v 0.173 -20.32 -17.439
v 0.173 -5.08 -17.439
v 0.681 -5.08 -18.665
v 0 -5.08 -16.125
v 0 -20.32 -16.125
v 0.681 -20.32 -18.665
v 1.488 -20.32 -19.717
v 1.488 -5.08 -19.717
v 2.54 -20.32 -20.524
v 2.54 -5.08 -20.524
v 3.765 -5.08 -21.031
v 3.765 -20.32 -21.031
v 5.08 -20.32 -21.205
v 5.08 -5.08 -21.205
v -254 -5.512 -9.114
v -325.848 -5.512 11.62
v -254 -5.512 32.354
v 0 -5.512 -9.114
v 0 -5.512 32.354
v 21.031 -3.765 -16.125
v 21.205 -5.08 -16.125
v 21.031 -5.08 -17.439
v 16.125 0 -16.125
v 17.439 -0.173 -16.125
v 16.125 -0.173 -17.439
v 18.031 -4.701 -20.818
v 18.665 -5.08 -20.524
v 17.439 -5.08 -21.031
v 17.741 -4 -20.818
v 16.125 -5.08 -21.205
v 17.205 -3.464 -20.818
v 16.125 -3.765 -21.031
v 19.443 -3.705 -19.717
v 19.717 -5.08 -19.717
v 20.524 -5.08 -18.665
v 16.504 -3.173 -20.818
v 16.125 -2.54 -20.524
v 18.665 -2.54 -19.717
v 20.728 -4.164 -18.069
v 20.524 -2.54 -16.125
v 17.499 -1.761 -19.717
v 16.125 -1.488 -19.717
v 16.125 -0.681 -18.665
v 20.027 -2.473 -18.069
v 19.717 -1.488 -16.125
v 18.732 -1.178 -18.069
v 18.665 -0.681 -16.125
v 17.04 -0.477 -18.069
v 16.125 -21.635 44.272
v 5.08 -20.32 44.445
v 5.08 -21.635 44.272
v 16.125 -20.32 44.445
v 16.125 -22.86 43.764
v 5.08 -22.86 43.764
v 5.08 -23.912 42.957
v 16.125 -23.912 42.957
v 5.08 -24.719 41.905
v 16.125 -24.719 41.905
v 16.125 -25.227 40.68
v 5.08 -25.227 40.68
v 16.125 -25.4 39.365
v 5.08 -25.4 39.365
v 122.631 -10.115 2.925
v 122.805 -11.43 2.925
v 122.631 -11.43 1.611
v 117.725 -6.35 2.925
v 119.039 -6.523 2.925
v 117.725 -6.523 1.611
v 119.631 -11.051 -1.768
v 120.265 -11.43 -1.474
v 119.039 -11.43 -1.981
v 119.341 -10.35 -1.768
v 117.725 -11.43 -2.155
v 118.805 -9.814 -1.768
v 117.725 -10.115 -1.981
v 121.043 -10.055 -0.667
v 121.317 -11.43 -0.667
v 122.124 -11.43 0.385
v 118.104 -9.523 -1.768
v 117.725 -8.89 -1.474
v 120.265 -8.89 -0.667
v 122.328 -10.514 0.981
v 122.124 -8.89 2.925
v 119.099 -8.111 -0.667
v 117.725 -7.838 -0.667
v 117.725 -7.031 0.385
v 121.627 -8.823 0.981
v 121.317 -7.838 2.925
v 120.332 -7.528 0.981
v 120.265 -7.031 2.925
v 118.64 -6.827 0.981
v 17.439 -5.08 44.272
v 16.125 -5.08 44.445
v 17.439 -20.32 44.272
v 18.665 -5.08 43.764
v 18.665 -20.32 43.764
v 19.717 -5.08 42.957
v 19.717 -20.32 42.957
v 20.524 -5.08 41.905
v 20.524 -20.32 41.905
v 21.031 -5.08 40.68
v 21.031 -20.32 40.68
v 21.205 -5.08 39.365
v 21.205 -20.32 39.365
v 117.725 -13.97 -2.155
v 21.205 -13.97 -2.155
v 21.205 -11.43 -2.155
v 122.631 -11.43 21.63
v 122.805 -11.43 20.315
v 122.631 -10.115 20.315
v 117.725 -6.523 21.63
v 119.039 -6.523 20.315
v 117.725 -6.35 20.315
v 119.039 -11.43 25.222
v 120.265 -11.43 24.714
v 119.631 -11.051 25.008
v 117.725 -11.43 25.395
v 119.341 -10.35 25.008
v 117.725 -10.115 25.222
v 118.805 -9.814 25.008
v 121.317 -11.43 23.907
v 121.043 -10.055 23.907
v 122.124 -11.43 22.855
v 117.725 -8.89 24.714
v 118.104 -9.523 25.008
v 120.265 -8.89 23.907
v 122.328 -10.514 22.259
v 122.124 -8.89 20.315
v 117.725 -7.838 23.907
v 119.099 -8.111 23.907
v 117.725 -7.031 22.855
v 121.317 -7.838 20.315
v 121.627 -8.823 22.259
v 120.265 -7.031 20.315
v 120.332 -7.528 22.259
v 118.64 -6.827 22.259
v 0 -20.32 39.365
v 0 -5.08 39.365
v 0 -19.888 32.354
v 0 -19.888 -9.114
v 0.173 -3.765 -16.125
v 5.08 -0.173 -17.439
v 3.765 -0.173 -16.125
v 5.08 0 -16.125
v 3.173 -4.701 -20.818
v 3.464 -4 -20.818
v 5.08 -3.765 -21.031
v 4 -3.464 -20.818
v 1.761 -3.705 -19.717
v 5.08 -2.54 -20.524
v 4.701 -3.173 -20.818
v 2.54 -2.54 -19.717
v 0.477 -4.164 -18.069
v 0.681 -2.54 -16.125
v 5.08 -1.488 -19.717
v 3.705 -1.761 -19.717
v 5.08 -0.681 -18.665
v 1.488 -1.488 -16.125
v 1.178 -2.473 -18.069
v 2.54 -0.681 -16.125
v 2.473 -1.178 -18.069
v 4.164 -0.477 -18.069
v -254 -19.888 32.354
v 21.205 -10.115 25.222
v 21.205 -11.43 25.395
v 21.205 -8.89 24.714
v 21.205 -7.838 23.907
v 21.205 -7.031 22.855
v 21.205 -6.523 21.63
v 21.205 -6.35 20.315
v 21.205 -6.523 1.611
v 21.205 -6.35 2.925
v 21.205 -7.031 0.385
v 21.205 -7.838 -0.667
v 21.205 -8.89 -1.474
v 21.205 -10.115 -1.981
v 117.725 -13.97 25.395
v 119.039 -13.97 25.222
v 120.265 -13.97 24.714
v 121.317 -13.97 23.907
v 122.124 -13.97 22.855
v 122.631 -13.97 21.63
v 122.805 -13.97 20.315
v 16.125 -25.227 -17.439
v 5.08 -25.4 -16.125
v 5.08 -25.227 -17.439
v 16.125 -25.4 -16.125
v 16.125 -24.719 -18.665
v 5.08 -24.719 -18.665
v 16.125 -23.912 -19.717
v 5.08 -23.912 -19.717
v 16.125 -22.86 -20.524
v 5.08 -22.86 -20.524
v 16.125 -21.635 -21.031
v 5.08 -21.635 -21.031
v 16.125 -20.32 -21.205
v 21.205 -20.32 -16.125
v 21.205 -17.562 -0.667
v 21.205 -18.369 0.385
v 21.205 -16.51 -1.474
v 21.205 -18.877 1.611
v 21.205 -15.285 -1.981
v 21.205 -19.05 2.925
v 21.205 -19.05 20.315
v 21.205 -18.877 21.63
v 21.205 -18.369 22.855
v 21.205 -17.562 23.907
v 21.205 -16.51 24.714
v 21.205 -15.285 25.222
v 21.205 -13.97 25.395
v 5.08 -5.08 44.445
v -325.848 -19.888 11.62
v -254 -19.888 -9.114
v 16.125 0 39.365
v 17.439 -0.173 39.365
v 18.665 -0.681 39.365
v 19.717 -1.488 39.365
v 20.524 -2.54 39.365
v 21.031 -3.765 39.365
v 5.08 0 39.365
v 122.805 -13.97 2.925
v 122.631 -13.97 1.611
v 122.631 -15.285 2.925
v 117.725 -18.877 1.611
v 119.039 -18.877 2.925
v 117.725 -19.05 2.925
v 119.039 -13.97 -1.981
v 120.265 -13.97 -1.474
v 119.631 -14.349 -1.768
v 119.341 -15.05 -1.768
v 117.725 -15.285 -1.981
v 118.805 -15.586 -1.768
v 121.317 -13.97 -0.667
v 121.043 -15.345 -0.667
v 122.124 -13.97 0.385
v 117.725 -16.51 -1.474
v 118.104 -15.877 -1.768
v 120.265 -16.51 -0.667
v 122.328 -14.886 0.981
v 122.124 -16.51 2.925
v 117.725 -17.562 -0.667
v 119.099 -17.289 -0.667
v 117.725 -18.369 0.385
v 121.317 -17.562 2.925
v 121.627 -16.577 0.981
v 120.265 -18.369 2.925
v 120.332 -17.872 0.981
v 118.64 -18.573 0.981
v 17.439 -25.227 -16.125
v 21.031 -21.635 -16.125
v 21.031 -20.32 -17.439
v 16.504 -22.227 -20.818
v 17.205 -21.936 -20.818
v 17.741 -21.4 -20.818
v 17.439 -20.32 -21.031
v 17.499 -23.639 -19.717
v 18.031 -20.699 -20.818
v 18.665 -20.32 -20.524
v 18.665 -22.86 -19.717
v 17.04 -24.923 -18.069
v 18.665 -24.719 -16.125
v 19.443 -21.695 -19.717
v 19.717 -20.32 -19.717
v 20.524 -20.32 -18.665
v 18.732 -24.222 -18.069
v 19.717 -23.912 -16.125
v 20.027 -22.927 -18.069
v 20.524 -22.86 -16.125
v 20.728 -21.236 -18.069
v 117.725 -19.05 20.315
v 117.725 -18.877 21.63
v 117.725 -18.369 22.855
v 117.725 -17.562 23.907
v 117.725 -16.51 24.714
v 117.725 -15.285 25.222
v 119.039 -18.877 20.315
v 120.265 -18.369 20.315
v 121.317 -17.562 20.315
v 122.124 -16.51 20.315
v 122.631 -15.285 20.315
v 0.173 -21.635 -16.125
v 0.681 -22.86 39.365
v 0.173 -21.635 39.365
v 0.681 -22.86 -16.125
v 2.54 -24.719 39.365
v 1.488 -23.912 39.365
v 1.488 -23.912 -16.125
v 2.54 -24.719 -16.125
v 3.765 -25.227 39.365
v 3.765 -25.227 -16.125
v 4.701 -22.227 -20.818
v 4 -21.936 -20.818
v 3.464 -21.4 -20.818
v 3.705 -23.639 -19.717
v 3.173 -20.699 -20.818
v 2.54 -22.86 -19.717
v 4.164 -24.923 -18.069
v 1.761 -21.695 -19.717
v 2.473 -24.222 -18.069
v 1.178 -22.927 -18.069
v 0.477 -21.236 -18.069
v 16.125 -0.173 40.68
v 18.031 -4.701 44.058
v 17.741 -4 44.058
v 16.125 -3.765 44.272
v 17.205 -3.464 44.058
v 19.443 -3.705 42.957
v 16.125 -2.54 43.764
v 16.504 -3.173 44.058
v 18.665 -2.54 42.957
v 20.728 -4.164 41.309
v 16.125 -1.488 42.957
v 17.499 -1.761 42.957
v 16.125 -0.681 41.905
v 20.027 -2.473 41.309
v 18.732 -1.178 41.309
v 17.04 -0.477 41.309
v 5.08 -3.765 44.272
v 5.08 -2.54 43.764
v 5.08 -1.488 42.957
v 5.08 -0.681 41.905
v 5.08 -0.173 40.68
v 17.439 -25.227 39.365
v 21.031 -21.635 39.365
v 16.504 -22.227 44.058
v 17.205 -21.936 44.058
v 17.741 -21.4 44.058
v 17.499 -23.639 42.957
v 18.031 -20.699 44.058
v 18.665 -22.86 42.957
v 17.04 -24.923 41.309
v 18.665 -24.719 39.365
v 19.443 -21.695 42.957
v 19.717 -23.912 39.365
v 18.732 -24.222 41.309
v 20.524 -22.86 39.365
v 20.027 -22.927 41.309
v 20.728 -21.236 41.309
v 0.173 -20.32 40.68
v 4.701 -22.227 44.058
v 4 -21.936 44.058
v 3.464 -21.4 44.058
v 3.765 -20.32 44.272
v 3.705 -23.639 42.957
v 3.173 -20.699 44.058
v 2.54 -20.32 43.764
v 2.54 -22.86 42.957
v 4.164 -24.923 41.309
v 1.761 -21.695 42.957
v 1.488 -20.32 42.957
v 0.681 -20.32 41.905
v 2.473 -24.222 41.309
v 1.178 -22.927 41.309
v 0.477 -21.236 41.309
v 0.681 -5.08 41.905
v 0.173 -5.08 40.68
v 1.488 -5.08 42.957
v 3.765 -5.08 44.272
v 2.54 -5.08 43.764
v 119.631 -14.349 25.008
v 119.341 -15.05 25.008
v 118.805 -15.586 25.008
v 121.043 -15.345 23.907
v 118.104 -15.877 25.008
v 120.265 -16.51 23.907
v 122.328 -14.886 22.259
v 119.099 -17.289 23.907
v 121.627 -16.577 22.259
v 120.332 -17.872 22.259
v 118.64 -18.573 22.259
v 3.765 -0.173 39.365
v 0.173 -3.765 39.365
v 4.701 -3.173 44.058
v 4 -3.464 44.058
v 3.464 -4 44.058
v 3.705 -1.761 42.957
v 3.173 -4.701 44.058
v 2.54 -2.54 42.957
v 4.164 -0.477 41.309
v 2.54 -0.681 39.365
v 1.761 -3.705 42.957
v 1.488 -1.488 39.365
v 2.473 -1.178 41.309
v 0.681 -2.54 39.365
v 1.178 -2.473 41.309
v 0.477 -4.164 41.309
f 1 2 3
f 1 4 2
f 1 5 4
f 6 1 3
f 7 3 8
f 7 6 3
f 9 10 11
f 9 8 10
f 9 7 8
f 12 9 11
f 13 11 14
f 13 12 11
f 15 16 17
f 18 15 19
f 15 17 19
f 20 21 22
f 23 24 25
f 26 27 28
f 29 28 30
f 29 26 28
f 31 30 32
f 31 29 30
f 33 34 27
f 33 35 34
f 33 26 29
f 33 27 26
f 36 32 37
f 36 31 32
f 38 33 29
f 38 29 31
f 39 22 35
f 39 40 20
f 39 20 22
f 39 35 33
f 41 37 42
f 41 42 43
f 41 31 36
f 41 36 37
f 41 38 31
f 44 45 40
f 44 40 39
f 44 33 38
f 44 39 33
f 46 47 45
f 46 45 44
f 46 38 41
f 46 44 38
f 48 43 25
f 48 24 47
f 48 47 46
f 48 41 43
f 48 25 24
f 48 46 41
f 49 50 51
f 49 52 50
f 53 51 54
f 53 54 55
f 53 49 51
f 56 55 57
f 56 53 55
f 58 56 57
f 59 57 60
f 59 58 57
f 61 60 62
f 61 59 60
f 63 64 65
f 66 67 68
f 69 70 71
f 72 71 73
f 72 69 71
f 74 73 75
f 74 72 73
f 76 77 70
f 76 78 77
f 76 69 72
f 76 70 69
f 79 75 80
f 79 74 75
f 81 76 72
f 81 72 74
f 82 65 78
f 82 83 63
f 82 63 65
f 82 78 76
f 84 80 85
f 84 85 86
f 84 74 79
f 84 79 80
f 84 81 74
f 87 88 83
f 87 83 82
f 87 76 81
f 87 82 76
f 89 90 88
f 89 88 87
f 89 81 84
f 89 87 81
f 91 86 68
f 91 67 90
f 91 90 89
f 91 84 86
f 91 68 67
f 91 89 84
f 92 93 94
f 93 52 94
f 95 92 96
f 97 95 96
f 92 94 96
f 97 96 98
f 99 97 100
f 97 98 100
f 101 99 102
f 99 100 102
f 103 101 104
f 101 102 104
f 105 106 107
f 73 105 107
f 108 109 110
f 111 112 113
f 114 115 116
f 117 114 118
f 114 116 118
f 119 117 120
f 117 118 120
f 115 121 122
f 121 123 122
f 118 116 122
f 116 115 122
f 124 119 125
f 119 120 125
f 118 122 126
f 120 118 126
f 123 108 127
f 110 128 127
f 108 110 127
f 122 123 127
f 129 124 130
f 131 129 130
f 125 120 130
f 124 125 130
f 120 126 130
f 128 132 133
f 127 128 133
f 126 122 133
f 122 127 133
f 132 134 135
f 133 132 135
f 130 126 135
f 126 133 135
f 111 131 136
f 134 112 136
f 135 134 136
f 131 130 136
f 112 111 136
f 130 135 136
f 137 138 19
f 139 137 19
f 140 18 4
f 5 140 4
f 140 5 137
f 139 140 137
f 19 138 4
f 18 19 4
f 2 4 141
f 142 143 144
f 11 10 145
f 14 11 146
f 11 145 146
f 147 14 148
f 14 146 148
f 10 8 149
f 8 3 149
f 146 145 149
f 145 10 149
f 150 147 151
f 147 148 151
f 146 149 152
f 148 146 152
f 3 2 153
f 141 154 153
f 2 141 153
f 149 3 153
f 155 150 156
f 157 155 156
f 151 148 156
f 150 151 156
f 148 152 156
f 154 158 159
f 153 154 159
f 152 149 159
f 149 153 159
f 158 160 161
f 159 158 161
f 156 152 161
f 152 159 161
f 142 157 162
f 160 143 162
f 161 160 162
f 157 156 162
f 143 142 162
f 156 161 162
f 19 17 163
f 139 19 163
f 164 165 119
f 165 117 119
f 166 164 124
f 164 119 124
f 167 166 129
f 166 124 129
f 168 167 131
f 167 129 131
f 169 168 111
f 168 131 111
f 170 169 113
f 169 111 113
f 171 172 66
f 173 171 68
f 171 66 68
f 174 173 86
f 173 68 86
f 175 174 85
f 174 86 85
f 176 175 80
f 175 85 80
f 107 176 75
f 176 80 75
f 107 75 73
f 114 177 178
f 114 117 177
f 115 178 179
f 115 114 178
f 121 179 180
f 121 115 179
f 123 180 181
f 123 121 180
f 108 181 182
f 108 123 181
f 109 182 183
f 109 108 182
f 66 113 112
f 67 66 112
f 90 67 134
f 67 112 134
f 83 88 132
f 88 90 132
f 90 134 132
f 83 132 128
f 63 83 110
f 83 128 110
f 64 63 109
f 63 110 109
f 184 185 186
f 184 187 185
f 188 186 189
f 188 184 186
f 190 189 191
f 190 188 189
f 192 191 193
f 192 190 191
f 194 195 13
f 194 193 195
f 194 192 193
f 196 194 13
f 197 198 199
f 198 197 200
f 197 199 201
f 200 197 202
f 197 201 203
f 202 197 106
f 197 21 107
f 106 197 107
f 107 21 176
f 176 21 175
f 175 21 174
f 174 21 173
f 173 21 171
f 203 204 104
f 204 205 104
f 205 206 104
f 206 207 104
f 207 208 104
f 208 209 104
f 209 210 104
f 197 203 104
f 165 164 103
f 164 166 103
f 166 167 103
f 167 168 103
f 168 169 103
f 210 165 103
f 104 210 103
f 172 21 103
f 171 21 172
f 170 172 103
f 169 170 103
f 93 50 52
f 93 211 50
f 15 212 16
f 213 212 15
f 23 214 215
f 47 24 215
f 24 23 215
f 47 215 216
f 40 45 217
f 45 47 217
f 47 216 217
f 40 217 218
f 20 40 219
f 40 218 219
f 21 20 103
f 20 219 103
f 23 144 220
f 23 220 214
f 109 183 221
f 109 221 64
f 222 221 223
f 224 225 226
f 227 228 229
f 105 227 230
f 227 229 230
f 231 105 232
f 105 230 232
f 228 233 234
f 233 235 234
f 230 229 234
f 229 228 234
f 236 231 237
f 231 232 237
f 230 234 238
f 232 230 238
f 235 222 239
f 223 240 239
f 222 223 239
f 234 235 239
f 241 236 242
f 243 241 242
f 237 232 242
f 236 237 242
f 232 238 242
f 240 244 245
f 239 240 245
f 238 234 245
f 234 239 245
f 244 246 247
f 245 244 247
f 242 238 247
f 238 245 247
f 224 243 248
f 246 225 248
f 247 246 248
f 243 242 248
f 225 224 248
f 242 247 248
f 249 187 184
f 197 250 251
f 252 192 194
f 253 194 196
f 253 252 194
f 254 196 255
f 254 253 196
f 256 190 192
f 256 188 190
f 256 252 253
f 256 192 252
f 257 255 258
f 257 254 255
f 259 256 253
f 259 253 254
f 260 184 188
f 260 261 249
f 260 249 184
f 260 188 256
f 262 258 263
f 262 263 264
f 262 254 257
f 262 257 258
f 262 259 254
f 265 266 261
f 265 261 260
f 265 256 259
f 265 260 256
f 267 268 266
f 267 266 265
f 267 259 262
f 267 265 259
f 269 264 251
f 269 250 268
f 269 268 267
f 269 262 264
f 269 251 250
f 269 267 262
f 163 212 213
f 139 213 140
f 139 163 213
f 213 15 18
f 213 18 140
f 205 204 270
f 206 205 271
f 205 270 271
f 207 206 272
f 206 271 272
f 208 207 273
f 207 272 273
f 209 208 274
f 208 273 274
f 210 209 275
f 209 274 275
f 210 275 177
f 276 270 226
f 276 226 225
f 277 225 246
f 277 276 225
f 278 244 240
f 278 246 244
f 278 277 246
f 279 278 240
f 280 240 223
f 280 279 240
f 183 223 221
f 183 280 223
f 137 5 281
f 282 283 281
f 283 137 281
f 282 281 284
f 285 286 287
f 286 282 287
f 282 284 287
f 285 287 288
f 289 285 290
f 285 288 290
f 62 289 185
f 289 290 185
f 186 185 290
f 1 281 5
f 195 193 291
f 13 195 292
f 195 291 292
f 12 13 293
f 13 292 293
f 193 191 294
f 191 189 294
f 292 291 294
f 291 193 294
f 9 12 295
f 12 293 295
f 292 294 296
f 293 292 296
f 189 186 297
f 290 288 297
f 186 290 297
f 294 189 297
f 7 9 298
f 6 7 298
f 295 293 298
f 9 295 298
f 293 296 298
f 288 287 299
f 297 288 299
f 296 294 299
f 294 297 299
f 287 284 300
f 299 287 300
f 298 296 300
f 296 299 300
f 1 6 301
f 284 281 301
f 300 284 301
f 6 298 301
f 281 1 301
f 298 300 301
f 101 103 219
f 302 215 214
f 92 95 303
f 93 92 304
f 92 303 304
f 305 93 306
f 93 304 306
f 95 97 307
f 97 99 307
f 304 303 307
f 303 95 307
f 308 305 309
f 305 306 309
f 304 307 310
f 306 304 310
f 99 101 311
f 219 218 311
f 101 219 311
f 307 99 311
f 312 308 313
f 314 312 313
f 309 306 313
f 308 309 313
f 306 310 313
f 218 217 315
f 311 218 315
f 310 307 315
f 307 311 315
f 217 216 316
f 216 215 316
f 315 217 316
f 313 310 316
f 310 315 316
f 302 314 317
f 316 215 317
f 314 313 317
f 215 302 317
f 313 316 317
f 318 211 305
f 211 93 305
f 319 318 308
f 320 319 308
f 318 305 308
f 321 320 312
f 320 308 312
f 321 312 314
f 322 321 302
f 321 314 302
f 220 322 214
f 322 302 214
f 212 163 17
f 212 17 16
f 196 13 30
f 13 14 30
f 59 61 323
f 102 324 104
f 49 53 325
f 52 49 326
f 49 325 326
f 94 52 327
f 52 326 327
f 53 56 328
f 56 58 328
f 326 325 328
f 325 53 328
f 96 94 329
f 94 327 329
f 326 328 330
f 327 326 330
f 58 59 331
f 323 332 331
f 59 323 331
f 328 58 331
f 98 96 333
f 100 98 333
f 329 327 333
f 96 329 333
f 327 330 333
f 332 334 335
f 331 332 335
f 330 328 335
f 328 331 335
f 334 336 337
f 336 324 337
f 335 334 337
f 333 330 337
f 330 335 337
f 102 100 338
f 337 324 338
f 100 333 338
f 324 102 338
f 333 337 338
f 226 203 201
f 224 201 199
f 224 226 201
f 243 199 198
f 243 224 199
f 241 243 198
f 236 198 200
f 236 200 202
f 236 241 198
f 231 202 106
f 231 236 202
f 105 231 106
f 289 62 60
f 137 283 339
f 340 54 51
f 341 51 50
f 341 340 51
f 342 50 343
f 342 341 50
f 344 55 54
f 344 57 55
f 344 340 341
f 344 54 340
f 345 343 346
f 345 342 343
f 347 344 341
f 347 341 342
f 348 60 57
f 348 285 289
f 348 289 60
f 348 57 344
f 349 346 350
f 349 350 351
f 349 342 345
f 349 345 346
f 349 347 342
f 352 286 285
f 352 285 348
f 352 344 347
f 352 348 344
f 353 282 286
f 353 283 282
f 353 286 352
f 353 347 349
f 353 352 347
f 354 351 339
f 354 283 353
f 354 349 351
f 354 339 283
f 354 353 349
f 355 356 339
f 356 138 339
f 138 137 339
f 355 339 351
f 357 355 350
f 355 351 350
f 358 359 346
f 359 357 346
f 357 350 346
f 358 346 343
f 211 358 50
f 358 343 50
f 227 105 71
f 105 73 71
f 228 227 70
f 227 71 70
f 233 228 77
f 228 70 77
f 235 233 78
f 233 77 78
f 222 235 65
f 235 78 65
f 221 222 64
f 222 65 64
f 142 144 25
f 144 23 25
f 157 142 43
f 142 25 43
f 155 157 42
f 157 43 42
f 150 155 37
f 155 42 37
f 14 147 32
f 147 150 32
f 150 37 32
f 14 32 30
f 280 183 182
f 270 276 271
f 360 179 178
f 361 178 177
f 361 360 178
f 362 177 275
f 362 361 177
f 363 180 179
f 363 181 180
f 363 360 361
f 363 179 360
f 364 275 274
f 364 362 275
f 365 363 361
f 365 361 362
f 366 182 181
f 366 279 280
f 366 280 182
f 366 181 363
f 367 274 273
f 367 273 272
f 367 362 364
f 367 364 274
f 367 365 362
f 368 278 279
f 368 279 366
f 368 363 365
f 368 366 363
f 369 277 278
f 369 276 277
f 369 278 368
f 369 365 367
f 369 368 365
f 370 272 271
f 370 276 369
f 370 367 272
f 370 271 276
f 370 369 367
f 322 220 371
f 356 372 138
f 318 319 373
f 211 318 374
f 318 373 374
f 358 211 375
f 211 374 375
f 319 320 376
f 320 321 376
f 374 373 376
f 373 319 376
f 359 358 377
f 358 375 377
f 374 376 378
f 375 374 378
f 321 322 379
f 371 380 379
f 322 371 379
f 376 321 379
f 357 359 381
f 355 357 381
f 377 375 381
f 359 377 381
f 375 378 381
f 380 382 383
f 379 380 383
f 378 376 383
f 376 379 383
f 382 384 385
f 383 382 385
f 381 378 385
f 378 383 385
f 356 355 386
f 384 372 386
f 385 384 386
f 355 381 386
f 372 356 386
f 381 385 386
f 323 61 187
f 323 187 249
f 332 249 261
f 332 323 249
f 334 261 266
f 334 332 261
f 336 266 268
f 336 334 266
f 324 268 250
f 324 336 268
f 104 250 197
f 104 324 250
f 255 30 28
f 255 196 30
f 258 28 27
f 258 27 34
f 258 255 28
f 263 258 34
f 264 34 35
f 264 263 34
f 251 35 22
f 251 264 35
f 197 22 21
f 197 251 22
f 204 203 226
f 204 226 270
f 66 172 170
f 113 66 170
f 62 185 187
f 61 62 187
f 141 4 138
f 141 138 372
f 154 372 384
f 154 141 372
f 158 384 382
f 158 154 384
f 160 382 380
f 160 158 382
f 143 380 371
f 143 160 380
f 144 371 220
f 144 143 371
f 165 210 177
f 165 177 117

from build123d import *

# Parameters (mm, degrees)
F0_W     = 21.2045684457
F0_H     = 21.2045684457
F0_H_2   = 23.2402067631
F1_DEPTH = 25.4
F2_W     = 12.7
F2_H     = 27.5493436545
F3_DEPTH = 101.6
F4_W     = 14.3764
F4_H     = 41.4685436545
F5_DEPTH = 254
F7_DEPTH = 14.3764
F8_R     = 5.08


with BuildPart() as f1:
    # F0 (on Front) → F1 (new body)
    with BuildSketch(Plane.XZ):
        with Locations((10.6022842228, 33.842490986)):
            Rectangle(F0_W, F0_H)
        with Locations((10.6022842228, -10.6022842228)):
            Rectangle(F0_W, F0_H)
        with Locations((10.6022842228, 11.6201033816)):
            Rectangle(F0_W, F0_H_2)
    extrude(amount=F1_DEPTH)

    # F2 (on face) → F3 (join)
    with BuildSketch(Plane.YZ.offset(21.2045684457)):
        with Locations((-12.7, 11.6201033816)):
            Rectangle(F2_W, F2_H)
    extrude(amount=F3_DEPTH)

    # F4 (on face) → F5 (join)
    with BuildSketch(Plane(origin=(0, 0, 0), x_dir=(0, -1, 0), z_dir=(-1, 0, 0))):
        with Locations((12.7, 11.6201033816)):
            Rectangle(F4_W, F4_H)
    extrude(amount=F5_DEPTH)

    # F6 (on face) → F7 (join)
    with BuildSketch(Plane.XZ.offset(19.8882)):
        Polygon((-254, -9.1141684457), (-254, 32.3543752088), (-325.8476853371, 11.6201033816), align=None)
    extrude(amount=-F7_DEPTH)

    # F8
    f8_edges = [f1.edges().sort_by_distance(p)[0] for p in [
        (21.204568, -25.4, 11.620103),
        (0, -25.4, 11.620103),
        (0, 0, 11.620103),
        (21.204568, 0, 11.620103),
        (10.602284, -25.4, 44.444775),
        (21.204568, -12.7, 44.444775),
        (10.602284, 0, 44.444775),
        (0, -12.7, 44.444775),
        (10.602284, -25.4, -21.204568),
        (21.204568, -12.7, -21.204568),
        (0, -12.7, -21.204568),
        (10.602284, 0, -21.204568),
        (122.804568, -19.05, 11.620103),
        (122.804568, -6.35, 11.620103),
        (122.804568, -12.7, -2.154568),
        (122.804568, -12.7, 25.394775),
        (72.004568, -19.05, 25.394775),
        (72.004568, -6.35, 25.394775),
        (72.004568, -19.05, -2.154568),
        (72.004568, -6.35, -2.154568),
    ]]
    fillet(f8_edges, radius=F8_R)


solid = f1.part
